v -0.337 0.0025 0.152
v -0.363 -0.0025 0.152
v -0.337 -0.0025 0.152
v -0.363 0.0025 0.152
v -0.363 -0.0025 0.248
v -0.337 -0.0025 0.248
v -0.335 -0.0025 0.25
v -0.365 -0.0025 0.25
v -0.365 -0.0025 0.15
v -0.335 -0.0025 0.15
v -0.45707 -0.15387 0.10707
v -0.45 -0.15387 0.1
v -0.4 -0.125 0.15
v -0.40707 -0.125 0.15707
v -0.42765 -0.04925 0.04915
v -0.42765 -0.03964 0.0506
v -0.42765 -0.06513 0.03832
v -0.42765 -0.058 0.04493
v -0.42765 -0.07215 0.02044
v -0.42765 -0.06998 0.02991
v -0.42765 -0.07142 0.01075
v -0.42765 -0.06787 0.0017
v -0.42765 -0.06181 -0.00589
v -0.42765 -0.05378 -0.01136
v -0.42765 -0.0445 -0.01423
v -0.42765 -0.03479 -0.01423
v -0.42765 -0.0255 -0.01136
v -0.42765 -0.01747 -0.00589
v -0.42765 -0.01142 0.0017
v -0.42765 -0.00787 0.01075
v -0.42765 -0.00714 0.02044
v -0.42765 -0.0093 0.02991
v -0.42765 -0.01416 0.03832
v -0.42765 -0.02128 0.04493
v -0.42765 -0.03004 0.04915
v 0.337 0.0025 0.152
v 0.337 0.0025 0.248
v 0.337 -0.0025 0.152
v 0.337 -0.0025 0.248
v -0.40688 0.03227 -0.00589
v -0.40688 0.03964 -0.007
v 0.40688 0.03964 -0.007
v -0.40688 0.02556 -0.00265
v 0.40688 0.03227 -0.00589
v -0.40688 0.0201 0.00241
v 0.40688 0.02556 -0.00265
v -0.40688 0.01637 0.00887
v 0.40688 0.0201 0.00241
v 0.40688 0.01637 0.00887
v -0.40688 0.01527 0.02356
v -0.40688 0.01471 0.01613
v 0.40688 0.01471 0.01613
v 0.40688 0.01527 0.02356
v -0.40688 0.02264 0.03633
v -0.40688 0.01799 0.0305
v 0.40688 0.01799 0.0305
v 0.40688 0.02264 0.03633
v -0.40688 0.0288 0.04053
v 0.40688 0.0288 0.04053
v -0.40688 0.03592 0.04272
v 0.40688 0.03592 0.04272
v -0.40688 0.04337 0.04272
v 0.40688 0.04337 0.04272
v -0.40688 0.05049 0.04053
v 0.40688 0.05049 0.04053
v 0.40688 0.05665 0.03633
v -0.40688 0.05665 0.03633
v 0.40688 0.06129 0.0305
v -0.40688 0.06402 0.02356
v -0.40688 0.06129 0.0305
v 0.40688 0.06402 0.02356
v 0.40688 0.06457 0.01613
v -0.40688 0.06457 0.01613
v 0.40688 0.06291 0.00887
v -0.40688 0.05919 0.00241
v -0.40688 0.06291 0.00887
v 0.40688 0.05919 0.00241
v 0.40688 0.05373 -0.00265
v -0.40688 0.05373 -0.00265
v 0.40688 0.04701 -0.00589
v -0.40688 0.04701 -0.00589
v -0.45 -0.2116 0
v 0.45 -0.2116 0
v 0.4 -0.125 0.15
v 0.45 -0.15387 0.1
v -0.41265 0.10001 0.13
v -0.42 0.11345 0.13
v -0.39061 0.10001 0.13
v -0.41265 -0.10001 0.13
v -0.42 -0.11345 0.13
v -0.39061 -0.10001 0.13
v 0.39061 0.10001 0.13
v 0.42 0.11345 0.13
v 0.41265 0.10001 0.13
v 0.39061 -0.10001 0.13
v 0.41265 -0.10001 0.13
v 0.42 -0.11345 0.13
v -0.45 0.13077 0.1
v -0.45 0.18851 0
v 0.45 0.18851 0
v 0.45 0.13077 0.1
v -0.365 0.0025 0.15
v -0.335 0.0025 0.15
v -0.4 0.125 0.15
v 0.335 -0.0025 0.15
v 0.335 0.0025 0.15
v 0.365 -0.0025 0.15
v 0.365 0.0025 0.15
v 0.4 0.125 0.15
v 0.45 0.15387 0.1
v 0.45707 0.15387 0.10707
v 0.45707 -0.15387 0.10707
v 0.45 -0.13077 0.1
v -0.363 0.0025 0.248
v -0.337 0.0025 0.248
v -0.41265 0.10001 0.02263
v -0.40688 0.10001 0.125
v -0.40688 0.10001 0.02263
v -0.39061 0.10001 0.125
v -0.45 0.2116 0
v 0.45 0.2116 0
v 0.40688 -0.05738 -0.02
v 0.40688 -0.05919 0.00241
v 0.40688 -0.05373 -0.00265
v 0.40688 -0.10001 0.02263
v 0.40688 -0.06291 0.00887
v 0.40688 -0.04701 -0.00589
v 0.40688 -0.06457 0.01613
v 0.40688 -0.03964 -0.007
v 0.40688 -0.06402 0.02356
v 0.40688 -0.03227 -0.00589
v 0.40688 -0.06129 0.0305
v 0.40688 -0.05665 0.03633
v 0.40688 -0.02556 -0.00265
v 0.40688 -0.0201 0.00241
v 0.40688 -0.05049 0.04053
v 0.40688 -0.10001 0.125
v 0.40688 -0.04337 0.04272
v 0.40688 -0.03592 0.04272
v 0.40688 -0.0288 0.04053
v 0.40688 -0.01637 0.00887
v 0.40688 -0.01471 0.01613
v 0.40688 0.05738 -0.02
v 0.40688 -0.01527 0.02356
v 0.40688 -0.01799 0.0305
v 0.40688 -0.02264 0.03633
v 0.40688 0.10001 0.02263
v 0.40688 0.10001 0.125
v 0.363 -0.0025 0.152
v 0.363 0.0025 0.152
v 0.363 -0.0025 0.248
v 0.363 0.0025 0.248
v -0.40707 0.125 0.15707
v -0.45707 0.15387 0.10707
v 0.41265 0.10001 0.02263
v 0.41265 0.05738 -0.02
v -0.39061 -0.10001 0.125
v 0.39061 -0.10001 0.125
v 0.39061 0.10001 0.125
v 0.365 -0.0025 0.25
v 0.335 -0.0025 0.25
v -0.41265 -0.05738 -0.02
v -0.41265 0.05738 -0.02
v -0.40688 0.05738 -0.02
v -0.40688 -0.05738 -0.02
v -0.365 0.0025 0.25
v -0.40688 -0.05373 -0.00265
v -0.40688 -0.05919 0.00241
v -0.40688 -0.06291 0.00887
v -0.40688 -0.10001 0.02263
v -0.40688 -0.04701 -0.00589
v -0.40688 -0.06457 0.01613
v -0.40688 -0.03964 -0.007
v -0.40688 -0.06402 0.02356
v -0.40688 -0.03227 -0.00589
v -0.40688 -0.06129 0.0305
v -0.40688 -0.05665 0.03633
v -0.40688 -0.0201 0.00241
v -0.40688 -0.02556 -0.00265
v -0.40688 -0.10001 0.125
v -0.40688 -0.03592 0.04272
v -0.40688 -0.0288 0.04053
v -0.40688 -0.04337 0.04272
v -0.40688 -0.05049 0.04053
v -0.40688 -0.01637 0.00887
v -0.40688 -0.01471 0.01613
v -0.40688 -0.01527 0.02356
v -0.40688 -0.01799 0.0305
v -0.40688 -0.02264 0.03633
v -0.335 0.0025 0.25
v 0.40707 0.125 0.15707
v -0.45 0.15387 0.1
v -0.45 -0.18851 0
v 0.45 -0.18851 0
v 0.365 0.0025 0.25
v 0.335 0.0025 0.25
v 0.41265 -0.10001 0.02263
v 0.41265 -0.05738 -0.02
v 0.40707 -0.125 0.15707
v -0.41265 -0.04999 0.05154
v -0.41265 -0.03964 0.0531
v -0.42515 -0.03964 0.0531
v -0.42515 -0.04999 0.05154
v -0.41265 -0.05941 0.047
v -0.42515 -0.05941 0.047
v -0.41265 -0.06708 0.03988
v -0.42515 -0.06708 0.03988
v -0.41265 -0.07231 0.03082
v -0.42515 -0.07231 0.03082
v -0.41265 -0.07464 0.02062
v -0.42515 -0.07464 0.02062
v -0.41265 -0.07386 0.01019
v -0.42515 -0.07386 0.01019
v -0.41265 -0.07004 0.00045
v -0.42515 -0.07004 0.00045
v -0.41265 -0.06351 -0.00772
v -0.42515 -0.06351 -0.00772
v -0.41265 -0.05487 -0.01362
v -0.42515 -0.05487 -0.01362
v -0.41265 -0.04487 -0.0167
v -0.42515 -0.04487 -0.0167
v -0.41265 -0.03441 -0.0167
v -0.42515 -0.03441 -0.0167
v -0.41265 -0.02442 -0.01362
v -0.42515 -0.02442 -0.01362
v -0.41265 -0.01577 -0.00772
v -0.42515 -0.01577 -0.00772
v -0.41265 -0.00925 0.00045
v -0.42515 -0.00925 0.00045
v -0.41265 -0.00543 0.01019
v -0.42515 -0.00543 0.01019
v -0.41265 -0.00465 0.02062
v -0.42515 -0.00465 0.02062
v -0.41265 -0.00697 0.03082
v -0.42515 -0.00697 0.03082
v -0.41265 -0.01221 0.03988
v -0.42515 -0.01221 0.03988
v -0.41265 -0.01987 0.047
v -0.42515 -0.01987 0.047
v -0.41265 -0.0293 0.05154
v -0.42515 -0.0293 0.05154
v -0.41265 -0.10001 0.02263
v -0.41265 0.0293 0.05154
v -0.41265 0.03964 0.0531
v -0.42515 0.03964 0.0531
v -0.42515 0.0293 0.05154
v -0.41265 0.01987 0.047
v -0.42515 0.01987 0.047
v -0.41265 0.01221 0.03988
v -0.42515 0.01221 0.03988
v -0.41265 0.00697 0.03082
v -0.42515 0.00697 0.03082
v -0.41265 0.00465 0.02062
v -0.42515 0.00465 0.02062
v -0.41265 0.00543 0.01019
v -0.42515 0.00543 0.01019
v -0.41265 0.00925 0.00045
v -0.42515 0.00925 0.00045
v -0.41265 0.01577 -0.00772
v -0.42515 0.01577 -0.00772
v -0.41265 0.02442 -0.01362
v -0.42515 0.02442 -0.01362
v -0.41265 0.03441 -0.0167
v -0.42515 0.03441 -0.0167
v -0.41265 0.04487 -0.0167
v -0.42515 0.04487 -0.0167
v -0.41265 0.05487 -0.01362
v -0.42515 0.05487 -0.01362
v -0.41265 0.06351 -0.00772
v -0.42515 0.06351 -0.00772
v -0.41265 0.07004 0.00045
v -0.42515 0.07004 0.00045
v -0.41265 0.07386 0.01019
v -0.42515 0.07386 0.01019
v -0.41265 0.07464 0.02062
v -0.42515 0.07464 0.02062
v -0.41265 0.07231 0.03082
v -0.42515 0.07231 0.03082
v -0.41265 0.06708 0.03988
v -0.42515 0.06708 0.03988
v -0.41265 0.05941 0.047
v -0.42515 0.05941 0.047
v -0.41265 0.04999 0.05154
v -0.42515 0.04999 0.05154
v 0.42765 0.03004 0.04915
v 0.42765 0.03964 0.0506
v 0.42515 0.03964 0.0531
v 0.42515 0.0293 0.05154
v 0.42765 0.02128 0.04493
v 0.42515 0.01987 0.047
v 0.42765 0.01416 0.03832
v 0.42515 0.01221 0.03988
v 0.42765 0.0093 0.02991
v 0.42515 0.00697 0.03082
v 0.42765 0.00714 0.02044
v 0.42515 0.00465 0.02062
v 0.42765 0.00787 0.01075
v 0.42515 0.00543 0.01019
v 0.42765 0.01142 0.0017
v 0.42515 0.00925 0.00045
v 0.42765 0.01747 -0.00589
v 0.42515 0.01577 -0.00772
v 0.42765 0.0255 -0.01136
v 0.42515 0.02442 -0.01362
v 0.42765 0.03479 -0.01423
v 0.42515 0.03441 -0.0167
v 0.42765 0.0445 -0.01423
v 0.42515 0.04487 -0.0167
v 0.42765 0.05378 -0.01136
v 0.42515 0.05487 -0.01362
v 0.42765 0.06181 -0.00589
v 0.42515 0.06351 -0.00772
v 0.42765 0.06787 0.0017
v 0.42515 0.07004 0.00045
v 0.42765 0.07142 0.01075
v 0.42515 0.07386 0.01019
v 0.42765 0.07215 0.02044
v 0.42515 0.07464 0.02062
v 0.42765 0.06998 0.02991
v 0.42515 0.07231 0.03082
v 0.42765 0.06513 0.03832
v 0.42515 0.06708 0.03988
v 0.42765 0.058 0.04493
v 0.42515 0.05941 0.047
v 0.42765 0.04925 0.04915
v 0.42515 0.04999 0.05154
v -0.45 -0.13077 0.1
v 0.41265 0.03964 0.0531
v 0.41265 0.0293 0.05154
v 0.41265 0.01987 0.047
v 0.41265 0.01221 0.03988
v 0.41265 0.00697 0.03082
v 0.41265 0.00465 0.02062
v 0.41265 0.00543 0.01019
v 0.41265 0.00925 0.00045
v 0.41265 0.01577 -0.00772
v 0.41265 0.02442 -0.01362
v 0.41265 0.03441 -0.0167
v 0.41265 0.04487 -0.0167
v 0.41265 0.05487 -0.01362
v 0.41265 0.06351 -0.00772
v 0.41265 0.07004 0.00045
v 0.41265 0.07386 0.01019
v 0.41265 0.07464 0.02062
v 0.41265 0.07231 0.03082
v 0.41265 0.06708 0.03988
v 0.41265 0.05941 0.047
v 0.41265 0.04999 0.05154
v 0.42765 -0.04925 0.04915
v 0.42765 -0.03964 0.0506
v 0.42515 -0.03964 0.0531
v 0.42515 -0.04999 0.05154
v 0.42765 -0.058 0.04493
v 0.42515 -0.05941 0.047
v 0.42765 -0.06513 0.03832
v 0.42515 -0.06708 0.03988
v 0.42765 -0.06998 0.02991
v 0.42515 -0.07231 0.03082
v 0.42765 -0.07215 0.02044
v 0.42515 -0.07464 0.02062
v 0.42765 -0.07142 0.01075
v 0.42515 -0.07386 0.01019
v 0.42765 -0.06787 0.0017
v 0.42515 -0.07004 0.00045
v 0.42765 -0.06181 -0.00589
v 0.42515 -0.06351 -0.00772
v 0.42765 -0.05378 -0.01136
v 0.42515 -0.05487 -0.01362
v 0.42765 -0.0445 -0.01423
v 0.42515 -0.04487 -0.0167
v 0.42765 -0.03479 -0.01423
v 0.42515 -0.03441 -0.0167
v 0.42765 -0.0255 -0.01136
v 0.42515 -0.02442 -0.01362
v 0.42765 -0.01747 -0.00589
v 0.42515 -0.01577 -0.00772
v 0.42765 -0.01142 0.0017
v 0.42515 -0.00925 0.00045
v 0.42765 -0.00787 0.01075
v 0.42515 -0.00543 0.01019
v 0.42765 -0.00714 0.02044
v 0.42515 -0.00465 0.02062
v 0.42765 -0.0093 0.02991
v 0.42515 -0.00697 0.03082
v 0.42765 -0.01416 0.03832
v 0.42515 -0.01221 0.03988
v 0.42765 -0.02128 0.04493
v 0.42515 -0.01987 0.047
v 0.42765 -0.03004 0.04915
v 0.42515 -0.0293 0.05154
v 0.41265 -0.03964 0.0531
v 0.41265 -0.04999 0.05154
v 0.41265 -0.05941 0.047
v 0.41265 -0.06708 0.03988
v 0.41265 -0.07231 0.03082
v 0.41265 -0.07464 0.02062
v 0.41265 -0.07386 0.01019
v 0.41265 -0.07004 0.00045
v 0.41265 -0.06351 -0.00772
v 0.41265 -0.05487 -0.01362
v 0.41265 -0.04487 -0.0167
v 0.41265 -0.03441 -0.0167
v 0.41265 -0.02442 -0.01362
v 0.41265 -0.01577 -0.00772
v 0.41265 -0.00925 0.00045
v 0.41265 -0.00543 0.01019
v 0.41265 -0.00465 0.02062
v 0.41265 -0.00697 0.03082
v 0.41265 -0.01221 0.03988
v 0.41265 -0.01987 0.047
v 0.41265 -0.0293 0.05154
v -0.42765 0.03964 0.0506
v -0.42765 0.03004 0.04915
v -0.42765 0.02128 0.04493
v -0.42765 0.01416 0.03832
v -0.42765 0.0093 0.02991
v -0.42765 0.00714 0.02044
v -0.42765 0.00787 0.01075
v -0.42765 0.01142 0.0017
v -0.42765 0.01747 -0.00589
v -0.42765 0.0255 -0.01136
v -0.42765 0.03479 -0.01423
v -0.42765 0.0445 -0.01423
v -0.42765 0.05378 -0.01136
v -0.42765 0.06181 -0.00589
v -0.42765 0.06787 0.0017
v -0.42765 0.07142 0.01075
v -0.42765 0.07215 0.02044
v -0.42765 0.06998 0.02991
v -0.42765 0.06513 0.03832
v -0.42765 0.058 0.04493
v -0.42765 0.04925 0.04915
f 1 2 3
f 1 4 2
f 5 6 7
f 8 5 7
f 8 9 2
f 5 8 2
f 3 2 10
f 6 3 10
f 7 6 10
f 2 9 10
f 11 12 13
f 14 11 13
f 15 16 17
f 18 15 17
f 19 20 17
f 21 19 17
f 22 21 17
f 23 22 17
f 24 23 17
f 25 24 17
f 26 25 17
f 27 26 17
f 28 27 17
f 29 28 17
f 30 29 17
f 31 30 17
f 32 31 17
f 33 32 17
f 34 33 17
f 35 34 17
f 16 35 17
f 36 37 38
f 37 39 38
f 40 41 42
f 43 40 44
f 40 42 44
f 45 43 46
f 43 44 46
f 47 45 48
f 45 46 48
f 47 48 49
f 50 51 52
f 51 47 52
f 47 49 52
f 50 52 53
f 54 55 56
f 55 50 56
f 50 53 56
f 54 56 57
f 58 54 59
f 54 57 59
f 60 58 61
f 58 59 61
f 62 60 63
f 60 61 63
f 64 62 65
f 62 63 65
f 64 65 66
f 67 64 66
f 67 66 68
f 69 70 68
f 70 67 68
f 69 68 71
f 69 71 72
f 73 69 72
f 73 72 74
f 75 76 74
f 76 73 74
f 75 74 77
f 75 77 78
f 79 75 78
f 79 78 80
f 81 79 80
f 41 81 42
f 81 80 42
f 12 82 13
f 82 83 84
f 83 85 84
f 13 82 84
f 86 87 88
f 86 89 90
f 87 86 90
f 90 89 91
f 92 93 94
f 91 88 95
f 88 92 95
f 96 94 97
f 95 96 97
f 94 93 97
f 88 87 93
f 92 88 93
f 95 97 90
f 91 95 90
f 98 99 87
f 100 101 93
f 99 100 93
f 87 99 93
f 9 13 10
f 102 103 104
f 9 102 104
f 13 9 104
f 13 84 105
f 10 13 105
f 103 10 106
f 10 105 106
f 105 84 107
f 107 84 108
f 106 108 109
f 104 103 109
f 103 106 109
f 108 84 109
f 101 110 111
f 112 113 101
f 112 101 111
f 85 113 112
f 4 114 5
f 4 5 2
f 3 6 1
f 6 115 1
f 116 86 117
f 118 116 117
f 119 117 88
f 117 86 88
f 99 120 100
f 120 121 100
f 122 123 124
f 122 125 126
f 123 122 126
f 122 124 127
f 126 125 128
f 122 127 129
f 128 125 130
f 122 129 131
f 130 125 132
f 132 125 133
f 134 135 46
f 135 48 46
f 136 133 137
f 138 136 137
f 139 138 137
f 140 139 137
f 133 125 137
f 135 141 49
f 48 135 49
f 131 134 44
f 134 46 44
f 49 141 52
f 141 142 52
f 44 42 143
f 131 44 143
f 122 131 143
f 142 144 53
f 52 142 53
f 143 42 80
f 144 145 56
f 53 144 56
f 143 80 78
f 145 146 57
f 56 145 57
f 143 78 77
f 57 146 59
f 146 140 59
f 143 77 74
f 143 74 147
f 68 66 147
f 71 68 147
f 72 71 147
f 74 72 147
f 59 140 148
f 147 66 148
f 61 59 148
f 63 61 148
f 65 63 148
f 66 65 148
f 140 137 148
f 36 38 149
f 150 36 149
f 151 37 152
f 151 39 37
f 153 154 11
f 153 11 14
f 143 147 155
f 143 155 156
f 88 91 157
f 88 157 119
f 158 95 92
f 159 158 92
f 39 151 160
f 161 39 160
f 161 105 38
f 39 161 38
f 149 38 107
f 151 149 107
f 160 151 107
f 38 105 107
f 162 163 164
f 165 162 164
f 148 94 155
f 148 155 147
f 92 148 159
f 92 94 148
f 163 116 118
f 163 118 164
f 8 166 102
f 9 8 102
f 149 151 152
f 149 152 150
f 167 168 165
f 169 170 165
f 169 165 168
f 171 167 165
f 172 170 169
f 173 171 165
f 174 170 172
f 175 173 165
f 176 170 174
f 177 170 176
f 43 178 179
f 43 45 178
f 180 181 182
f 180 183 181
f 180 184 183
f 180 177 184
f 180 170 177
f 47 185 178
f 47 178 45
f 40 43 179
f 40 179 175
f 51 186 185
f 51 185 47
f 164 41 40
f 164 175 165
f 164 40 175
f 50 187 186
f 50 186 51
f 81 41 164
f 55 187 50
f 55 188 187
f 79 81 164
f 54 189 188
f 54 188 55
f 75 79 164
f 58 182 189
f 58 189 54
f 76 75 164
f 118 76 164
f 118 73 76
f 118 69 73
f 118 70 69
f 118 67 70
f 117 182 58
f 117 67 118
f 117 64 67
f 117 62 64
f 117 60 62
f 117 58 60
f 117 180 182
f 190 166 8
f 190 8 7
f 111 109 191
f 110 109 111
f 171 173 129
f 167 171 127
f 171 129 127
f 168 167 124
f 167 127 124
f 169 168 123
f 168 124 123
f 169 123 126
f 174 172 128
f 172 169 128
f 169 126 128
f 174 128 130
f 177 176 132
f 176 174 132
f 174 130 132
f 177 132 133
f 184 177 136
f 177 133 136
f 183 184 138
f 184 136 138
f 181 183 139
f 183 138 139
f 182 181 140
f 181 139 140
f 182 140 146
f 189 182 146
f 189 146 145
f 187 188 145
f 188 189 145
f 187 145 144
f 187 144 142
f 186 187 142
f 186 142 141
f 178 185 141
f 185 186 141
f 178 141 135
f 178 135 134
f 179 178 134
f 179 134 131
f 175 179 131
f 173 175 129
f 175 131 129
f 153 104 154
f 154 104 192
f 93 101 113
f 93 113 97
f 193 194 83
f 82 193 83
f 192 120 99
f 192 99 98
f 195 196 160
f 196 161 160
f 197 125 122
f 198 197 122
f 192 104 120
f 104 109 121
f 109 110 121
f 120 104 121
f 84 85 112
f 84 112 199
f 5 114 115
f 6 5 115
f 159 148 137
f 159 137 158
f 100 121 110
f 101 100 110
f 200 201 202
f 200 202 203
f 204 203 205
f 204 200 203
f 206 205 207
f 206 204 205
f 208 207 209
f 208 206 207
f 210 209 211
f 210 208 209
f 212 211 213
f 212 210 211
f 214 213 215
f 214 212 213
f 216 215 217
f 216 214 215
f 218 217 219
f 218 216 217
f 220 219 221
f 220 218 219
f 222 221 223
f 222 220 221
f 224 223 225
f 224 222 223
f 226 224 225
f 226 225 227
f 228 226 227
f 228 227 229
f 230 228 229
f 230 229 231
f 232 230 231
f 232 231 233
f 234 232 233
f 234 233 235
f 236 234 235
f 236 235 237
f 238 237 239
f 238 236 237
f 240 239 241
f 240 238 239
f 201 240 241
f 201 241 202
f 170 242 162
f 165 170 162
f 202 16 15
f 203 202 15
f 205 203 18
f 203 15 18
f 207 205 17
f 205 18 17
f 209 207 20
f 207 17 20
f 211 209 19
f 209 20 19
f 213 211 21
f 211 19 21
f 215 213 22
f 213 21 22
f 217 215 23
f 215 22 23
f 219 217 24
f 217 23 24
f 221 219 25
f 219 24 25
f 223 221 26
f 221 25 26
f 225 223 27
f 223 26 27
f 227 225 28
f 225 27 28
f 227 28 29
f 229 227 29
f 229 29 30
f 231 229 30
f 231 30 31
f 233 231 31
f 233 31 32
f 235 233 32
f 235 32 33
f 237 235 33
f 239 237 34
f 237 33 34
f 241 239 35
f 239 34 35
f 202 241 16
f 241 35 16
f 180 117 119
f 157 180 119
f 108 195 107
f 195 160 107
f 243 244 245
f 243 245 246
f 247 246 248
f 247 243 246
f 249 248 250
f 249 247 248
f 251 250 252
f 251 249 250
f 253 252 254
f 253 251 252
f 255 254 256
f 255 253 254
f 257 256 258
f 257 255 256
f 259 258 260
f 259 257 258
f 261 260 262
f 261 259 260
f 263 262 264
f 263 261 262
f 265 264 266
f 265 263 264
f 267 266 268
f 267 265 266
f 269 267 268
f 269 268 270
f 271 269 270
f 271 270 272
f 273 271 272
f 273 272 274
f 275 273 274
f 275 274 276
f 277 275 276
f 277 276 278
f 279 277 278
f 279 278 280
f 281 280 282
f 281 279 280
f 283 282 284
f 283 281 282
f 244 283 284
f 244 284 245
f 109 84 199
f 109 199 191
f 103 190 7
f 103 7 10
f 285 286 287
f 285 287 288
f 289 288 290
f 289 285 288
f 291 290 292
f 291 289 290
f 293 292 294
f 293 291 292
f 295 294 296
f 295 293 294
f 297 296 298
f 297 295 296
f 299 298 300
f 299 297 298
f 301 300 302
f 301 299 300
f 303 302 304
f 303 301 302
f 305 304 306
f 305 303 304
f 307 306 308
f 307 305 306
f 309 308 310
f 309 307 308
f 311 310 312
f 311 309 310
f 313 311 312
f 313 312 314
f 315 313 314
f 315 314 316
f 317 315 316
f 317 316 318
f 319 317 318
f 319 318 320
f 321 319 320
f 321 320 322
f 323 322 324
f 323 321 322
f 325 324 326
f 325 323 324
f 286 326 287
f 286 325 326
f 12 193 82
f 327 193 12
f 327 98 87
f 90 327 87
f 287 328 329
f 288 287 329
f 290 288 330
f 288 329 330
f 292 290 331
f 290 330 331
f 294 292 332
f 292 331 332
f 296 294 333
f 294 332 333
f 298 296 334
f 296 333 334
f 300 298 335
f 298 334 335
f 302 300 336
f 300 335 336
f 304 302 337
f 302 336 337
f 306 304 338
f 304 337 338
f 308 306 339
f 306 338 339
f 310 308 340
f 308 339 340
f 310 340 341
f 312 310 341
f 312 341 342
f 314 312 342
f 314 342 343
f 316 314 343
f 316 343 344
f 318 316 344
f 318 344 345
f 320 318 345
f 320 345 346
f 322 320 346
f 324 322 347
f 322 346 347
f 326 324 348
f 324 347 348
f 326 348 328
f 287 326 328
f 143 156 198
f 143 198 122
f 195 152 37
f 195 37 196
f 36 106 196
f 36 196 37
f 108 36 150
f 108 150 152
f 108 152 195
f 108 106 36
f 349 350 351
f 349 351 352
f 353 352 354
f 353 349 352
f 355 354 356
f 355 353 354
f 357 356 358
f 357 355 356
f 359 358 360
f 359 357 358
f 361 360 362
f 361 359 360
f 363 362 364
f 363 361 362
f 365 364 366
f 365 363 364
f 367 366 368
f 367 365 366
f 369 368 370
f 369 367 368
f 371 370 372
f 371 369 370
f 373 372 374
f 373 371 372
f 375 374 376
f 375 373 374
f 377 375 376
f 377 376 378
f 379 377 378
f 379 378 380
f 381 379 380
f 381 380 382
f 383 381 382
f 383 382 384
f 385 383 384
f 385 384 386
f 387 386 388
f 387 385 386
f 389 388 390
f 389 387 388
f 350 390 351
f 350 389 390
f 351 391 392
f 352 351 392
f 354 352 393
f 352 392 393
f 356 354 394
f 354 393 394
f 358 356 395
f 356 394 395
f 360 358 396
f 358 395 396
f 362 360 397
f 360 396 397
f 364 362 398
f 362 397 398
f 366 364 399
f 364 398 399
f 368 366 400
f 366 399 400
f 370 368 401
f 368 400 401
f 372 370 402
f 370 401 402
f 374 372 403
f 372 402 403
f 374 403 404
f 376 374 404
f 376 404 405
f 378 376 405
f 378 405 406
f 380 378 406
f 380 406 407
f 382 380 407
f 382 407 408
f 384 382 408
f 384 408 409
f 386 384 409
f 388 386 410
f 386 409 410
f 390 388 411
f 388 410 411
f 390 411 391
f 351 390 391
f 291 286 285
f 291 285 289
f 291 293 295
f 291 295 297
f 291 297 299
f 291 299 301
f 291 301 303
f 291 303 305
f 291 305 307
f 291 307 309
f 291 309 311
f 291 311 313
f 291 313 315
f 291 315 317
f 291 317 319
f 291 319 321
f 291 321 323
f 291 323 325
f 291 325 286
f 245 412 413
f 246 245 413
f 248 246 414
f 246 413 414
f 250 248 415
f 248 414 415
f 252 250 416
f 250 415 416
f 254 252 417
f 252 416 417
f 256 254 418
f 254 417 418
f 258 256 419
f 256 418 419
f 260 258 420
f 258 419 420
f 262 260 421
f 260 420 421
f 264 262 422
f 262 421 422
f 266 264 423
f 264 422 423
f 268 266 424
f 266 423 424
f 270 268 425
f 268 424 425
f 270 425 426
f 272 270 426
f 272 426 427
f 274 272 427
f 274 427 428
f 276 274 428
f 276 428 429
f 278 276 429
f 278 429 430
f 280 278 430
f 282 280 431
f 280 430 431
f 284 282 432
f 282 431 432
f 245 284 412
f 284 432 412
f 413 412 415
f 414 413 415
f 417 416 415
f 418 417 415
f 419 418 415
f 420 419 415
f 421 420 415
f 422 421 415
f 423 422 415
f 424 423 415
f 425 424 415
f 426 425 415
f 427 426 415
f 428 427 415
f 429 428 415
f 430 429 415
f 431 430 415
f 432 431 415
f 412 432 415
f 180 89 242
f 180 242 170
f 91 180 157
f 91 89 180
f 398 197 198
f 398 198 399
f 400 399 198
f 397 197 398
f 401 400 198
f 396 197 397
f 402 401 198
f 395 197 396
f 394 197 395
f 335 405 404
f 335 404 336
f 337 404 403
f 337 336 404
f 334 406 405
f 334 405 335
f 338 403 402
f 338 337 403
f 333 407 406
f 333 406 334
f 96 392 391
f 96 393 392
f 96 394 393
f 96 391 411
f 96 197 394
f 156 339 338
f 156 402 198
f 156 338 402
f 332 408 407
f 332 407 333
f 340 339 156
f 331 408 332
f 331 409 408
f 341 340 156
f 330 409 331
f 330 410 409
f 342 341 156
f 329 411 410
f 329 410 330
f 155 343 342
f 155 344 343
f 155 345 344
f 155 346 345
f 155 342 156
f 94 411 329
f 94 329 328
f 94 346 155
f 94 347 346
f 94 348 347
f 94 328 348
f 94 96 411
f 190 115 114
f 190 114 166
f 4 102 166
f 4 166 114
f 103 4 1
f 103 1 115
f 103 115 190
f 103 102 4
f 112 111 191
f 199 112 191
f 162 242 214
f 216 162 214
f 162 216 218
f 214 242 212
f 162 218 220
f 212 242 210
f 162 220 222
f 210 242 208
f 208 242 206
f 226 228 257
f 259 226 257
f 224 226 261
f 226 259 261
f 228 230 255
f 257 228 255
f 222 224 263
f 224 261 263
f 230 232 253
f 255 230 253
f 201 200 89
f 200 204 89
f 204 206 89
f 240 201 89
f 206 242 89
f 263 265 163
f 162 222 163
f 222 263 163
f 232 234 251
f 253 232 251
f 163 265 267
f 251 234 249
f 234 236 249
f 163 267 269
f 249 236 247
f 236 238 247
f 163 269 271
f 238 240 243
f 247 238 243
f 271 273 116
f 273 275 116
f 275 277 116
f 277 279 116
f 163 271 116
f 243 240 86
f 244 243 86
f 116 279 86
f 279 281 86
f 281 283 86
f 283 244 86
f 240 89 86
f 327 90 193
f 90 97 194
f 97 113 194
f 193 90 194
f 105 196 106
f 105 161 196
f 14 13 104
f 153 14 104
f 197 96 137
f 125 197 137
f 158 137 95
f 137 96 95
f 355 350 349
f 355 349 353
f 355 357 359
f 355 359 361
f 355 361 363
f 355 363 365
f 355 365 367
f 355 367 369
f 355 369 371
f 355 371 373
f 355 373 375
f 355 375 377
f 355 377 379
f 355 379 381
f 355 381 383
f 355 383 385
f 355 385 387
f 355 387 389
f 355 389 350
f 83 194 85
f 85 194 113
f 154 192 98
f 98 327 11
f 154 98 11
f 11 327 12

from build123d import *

# Parameters (mm, degrees)
BOSS_EXTRUDE1_DEPTH      = 0.45
CHAMFER1_SIZE            = 0.05
BOSS_EXTRUDE2_DEPTH      = 0.01
SKETCH3_W                = 0.005769739
SKETCH3_H                = 0.200017608
BOSS_EXTRUDE3_DEPTH      = 0.15
SKETCH4_W                = 0.016268309
SKETCH4_H                = 0.200017608
BOSS_EXTRUDE4_DEPTH      = 0.005
SKETCH5_W                = 0.03
SKETCH5_H                = 0.1
SKETCH5_W_2              = 0.026
SKETCH5_H_2              = 0.096
BOSS_EXTRUDE5_DEPTH      = 0.0025
BOSS_EXTRUDE6_REACH      = 2.924
SKETCH6_R                = 0.025
CUT_EXTRUDE1_DEPTH       = 1.929347517
SKETCH8_R                = 0.035094092
BOSS_EXTRUDE7_DEPTH      = 0.015
CHAMFER2_SIZE            = 0.0025
CHAMFER2_OF_MIRROR3_SIZE = 0.0025


with BuildPart() as part:
    # Sketch1 → Boss-Extrude1 (new, symmetric)
    with BuildSketch(Plane(origin=(0, 0, 0), x_dir=(0, 0, -1), z_dir=(1, 0, 0))):
        Polygon((-0.15, -0.125), (-0.15, 0.125), (0, 0.21160254), (0, 0.18850853), (-0.13, 0.113452995), (-0.13, -0.113452995), (0, -0.18850853), (0, -0.21160254), align=None)
    extrude(amount=BOSS_EXTRUDE1_DEPTH, both=True)

    # Chamfer1
    # the kernel refuses this chamfer: 0.05 mm, written as the material it takes off along each edge
    with BuildSketch(Plane(origin=(-0.45, -0.253584149, 0.15), x_dir=(0.9996219169112968, 0, 0.027495876610586285), z_dir=(0, 1, 0))) as chamfer1_piece_1:
        Polygon((CHAMFER1_SIZE * 0.999621916911, CHAMFER1_SIZE * 0.0274958766106), (-CHAMFER1_SIZE * 0.0274958766106, CHAMFER1_SIZE * 0.999621916911), (0, 0), align=None)
    extrude(amount=0.507168299, mode=Mode.SUBTRACT)
    with BuildSketch(Plane(origin=(0.45, -0.253584149, 0.15), x_dir=(-0.9996219169112968, 0, 0.027495876610586285), z_dir=(0, 1, 0))) as chamfer1_piece_2:
        Polygon((CHAMFER1_SIZE * 0.999621916911, -CHAMFER1_SIZE * 0.0274958766106), (-CHAMFER1_SIZE * 0.0274958766106, -CHAMFER1_SIZE * 0.999621916911), (0, 0), align=None)
    extrude(amount=0.507168299, mode=Mode.SUBTRACT)

    # Sketch2 → Boss-Extrude2 (add)
    with BuildSketch(Plane(origin=(0.275, 0, 0.275), x_dir=(0.7071067811865438, 0, -0.7071067811865513), z_dir=(0.7071067811865513, 0, 0.7071067811865438))):
        Polygon((0.176776695, 0.125), (0.247487373, 0.153867513), (0.247487373, -0.153867513), (0.176776695, -0.125), align=None)
    boss_extrude2 = extrude(amount=BOSS_EXTRUDE2_DEPTH)

    # Mirror1: Boss-Extrude2 across plane
    add(boss_extrude2.mirror(Plane(origin=(0, 0, 0), x_dir=(0, 0, 1), z_dir=(1, 0, 0))))

    # Sketch3 → Boss-Extrude3 (add)
    with BuildSketch(Plane(origin=(0, 0, 0.13), x_dir=(-1, 0, 0), z_dir=(0, 0, -1))):
        with Locations((-0.409763083, 0)):
            Rectangle(SKETCH3_W, SKETCH3_H)
    boss_extrude3 = extrude(amount=BOSS_EXTRUDE3_DEPTH)

    # Sketch4 → Boss-Extrude4 (add)
    with BuildSketch(Plane(origin=(0, 0, 0.13), x_dir=(-1, 0, 0), z_dir=(0, 0, -1))):
        with Locations((-0.398744059, 0)):
            Rectangle(SKETCH4_W, SKETCH4_H)
    boss_extrude4 = extrude(amount=BOSS_EXTRUDE4_DEPTH)

    # Sketch5 → Boss-Extrude5 (add, symmetric)
    # profile 1 of 2: a face of its own
    with BuildSketch(Plane(origin=(0, 0, 0), x_dir=(1, 0, 0), z_dir=(0, 1, 0))):
        with Locations((0.35, -0.2)):
            Rectangle(SKETCH5_W, SKETCH5_H)
        with Locations((0.35, -0.2)):
            Rectangle(SKETCH5_W_2, SKETCH5_H_2, mode=Mode.SUBTRACT)
    # profile 2 of 2: a face of its own
    with BuildSketch(Plane(origin=(0, 0, 0), x_dir=(1, 0, 0), z_dir=(0, 1, 0))):
        with Locations((-0.35, -0.2)):
            Rectangle(SKETCH5_W, SKETCH5_H)
        with Locations((-0.35, -0.2)):
            Rectangle(SKETCH5_W_2, SKETCH5_H_2, mode=Mode.SUBTRACT)
    extrude(amount=BOSS_EXTRUDE5_DEPTH, both=True)

    # Mirror2: Boss-Extrude3, Boss-Extrude4 across plane
    add(boss_extrude3.mirror(Plane(origin=(0, 0, 0), x_dir=(0, 0, 1), z_dir=(1, 0, 0))))
    add(boss_extrude4.mirror(Plane(origin=(0, 0, 0), x_dir=(0, 0, 1), z_dir=(1, 0, 0))))

    # Sketch6 → Boss-Extrude6 (add, up to next)
    with BuildSketch(Plane.ZY.offset(-0.406878213), mode=Mode.PRIVATE) as boss_extrude6_sk1:
        with Locations(Location((0.018001916, 0.039642936, 0), (0, 0, 180))):
            Circle(SKETCH6_R)
    boss_extrude6_tool1 = extrude(boss_extrude6_sk1.sketch, amount=BOSS_EXTRUDE6_REACH, mode=Mode.PRIVATE) - part.part
    # Sketch6 → Boss-Extrude6 (add, up to next)
    with BuildSketch(Plane.ZY.offset(-0.406878213), mode=Mode.PRIVATE) as boss_extrude6_sk2:
        with Locations(Location((0.018001916, -0.039642936, 0), (0, 0, 180))):
            Circle(SKETCH6_R)
    boss_extrude6_tool2 = extrude(boss_extrude6_sk2.sketch, amount=BOSS_EXTRUDE6_REACH, mode=Mode.PRIVATE) - part.part
    add(boss_extrude6_tool1.solids().sort_by_distance((0.406878, 0.039643, 0.018002))[0])
    add(boss_extrude6_tool2.solids().sort_by_distance((0.406878, -0.039643, 0.018002))[0])

    # Sketch7 → Cut-Extrude1 (cut, through all)
    with BuildSketch(Plane.ZY.offset(0.412647952)):
        Polygon((-0.02, 0.100008804), (0.02263059, 0.100008804), (-0.02, 0.057378214), align=None)
        Polygon((-0.02, -0.100008804), (0.02263059, -0.100008804), (-0.02, -0.057378214), align=None)
    extrude(amount=-CUT_EXTRUDE1_DEPTH, mode=Mode.SUBTRACT)

    # Sketch8 → Boss-Extrude7 (add)
    with BuildSketch(Plane(origin=(0.412647952, 0, 0), x_dir=(0, 0, -1), z_dir=(1, 0, 0))):
        with Locations(Location((-0.018001916, 0.039642936, 0), (0, 0, 180))):
            Circle(SKETCH8_R)
        with Locations(Location((-0.018001916, -0.039642936, 0), (0, 0, 180))):
            Circle(SKETCH8_R)
    boss_extrude7 = extrude(amount=BOSS_EXTRUDE7_DEPTH)

    # Chamfer2
    chamfer2_edges = [part.edges().sort_by_distance(p)[0] for p in [
        (0.427647952, 0.039642936, -0.017092176),
        (0.427647952, -0.039642936, -0.017092176),
    ]]
    chamfer(chamfer2_edges, length=CHAMFER2_SIZE)

    # Mirror3: Boss-Extrude7 across plane
    add(boss_extrude7.mirror(Plane(origin=(0, 0, 0), x_dir=(0, 0, 1), z_dir=(1, 0, 0))))

    # Chamfer2 of Mirror3
    chamfer2_of_mirror3_edges = [part.edges().sort_by_distance(p)[0] for p in [
        (-0.427647952, 0.039642936, -0.017092176),
        (-0.427647952, -0.039642936, -0.017092176),
    ]]
    chamfer(chamfer2_of_mirror3_edges, length=CHAMFER2_OF_MIRROR3_SIZE)


solid = part.part
